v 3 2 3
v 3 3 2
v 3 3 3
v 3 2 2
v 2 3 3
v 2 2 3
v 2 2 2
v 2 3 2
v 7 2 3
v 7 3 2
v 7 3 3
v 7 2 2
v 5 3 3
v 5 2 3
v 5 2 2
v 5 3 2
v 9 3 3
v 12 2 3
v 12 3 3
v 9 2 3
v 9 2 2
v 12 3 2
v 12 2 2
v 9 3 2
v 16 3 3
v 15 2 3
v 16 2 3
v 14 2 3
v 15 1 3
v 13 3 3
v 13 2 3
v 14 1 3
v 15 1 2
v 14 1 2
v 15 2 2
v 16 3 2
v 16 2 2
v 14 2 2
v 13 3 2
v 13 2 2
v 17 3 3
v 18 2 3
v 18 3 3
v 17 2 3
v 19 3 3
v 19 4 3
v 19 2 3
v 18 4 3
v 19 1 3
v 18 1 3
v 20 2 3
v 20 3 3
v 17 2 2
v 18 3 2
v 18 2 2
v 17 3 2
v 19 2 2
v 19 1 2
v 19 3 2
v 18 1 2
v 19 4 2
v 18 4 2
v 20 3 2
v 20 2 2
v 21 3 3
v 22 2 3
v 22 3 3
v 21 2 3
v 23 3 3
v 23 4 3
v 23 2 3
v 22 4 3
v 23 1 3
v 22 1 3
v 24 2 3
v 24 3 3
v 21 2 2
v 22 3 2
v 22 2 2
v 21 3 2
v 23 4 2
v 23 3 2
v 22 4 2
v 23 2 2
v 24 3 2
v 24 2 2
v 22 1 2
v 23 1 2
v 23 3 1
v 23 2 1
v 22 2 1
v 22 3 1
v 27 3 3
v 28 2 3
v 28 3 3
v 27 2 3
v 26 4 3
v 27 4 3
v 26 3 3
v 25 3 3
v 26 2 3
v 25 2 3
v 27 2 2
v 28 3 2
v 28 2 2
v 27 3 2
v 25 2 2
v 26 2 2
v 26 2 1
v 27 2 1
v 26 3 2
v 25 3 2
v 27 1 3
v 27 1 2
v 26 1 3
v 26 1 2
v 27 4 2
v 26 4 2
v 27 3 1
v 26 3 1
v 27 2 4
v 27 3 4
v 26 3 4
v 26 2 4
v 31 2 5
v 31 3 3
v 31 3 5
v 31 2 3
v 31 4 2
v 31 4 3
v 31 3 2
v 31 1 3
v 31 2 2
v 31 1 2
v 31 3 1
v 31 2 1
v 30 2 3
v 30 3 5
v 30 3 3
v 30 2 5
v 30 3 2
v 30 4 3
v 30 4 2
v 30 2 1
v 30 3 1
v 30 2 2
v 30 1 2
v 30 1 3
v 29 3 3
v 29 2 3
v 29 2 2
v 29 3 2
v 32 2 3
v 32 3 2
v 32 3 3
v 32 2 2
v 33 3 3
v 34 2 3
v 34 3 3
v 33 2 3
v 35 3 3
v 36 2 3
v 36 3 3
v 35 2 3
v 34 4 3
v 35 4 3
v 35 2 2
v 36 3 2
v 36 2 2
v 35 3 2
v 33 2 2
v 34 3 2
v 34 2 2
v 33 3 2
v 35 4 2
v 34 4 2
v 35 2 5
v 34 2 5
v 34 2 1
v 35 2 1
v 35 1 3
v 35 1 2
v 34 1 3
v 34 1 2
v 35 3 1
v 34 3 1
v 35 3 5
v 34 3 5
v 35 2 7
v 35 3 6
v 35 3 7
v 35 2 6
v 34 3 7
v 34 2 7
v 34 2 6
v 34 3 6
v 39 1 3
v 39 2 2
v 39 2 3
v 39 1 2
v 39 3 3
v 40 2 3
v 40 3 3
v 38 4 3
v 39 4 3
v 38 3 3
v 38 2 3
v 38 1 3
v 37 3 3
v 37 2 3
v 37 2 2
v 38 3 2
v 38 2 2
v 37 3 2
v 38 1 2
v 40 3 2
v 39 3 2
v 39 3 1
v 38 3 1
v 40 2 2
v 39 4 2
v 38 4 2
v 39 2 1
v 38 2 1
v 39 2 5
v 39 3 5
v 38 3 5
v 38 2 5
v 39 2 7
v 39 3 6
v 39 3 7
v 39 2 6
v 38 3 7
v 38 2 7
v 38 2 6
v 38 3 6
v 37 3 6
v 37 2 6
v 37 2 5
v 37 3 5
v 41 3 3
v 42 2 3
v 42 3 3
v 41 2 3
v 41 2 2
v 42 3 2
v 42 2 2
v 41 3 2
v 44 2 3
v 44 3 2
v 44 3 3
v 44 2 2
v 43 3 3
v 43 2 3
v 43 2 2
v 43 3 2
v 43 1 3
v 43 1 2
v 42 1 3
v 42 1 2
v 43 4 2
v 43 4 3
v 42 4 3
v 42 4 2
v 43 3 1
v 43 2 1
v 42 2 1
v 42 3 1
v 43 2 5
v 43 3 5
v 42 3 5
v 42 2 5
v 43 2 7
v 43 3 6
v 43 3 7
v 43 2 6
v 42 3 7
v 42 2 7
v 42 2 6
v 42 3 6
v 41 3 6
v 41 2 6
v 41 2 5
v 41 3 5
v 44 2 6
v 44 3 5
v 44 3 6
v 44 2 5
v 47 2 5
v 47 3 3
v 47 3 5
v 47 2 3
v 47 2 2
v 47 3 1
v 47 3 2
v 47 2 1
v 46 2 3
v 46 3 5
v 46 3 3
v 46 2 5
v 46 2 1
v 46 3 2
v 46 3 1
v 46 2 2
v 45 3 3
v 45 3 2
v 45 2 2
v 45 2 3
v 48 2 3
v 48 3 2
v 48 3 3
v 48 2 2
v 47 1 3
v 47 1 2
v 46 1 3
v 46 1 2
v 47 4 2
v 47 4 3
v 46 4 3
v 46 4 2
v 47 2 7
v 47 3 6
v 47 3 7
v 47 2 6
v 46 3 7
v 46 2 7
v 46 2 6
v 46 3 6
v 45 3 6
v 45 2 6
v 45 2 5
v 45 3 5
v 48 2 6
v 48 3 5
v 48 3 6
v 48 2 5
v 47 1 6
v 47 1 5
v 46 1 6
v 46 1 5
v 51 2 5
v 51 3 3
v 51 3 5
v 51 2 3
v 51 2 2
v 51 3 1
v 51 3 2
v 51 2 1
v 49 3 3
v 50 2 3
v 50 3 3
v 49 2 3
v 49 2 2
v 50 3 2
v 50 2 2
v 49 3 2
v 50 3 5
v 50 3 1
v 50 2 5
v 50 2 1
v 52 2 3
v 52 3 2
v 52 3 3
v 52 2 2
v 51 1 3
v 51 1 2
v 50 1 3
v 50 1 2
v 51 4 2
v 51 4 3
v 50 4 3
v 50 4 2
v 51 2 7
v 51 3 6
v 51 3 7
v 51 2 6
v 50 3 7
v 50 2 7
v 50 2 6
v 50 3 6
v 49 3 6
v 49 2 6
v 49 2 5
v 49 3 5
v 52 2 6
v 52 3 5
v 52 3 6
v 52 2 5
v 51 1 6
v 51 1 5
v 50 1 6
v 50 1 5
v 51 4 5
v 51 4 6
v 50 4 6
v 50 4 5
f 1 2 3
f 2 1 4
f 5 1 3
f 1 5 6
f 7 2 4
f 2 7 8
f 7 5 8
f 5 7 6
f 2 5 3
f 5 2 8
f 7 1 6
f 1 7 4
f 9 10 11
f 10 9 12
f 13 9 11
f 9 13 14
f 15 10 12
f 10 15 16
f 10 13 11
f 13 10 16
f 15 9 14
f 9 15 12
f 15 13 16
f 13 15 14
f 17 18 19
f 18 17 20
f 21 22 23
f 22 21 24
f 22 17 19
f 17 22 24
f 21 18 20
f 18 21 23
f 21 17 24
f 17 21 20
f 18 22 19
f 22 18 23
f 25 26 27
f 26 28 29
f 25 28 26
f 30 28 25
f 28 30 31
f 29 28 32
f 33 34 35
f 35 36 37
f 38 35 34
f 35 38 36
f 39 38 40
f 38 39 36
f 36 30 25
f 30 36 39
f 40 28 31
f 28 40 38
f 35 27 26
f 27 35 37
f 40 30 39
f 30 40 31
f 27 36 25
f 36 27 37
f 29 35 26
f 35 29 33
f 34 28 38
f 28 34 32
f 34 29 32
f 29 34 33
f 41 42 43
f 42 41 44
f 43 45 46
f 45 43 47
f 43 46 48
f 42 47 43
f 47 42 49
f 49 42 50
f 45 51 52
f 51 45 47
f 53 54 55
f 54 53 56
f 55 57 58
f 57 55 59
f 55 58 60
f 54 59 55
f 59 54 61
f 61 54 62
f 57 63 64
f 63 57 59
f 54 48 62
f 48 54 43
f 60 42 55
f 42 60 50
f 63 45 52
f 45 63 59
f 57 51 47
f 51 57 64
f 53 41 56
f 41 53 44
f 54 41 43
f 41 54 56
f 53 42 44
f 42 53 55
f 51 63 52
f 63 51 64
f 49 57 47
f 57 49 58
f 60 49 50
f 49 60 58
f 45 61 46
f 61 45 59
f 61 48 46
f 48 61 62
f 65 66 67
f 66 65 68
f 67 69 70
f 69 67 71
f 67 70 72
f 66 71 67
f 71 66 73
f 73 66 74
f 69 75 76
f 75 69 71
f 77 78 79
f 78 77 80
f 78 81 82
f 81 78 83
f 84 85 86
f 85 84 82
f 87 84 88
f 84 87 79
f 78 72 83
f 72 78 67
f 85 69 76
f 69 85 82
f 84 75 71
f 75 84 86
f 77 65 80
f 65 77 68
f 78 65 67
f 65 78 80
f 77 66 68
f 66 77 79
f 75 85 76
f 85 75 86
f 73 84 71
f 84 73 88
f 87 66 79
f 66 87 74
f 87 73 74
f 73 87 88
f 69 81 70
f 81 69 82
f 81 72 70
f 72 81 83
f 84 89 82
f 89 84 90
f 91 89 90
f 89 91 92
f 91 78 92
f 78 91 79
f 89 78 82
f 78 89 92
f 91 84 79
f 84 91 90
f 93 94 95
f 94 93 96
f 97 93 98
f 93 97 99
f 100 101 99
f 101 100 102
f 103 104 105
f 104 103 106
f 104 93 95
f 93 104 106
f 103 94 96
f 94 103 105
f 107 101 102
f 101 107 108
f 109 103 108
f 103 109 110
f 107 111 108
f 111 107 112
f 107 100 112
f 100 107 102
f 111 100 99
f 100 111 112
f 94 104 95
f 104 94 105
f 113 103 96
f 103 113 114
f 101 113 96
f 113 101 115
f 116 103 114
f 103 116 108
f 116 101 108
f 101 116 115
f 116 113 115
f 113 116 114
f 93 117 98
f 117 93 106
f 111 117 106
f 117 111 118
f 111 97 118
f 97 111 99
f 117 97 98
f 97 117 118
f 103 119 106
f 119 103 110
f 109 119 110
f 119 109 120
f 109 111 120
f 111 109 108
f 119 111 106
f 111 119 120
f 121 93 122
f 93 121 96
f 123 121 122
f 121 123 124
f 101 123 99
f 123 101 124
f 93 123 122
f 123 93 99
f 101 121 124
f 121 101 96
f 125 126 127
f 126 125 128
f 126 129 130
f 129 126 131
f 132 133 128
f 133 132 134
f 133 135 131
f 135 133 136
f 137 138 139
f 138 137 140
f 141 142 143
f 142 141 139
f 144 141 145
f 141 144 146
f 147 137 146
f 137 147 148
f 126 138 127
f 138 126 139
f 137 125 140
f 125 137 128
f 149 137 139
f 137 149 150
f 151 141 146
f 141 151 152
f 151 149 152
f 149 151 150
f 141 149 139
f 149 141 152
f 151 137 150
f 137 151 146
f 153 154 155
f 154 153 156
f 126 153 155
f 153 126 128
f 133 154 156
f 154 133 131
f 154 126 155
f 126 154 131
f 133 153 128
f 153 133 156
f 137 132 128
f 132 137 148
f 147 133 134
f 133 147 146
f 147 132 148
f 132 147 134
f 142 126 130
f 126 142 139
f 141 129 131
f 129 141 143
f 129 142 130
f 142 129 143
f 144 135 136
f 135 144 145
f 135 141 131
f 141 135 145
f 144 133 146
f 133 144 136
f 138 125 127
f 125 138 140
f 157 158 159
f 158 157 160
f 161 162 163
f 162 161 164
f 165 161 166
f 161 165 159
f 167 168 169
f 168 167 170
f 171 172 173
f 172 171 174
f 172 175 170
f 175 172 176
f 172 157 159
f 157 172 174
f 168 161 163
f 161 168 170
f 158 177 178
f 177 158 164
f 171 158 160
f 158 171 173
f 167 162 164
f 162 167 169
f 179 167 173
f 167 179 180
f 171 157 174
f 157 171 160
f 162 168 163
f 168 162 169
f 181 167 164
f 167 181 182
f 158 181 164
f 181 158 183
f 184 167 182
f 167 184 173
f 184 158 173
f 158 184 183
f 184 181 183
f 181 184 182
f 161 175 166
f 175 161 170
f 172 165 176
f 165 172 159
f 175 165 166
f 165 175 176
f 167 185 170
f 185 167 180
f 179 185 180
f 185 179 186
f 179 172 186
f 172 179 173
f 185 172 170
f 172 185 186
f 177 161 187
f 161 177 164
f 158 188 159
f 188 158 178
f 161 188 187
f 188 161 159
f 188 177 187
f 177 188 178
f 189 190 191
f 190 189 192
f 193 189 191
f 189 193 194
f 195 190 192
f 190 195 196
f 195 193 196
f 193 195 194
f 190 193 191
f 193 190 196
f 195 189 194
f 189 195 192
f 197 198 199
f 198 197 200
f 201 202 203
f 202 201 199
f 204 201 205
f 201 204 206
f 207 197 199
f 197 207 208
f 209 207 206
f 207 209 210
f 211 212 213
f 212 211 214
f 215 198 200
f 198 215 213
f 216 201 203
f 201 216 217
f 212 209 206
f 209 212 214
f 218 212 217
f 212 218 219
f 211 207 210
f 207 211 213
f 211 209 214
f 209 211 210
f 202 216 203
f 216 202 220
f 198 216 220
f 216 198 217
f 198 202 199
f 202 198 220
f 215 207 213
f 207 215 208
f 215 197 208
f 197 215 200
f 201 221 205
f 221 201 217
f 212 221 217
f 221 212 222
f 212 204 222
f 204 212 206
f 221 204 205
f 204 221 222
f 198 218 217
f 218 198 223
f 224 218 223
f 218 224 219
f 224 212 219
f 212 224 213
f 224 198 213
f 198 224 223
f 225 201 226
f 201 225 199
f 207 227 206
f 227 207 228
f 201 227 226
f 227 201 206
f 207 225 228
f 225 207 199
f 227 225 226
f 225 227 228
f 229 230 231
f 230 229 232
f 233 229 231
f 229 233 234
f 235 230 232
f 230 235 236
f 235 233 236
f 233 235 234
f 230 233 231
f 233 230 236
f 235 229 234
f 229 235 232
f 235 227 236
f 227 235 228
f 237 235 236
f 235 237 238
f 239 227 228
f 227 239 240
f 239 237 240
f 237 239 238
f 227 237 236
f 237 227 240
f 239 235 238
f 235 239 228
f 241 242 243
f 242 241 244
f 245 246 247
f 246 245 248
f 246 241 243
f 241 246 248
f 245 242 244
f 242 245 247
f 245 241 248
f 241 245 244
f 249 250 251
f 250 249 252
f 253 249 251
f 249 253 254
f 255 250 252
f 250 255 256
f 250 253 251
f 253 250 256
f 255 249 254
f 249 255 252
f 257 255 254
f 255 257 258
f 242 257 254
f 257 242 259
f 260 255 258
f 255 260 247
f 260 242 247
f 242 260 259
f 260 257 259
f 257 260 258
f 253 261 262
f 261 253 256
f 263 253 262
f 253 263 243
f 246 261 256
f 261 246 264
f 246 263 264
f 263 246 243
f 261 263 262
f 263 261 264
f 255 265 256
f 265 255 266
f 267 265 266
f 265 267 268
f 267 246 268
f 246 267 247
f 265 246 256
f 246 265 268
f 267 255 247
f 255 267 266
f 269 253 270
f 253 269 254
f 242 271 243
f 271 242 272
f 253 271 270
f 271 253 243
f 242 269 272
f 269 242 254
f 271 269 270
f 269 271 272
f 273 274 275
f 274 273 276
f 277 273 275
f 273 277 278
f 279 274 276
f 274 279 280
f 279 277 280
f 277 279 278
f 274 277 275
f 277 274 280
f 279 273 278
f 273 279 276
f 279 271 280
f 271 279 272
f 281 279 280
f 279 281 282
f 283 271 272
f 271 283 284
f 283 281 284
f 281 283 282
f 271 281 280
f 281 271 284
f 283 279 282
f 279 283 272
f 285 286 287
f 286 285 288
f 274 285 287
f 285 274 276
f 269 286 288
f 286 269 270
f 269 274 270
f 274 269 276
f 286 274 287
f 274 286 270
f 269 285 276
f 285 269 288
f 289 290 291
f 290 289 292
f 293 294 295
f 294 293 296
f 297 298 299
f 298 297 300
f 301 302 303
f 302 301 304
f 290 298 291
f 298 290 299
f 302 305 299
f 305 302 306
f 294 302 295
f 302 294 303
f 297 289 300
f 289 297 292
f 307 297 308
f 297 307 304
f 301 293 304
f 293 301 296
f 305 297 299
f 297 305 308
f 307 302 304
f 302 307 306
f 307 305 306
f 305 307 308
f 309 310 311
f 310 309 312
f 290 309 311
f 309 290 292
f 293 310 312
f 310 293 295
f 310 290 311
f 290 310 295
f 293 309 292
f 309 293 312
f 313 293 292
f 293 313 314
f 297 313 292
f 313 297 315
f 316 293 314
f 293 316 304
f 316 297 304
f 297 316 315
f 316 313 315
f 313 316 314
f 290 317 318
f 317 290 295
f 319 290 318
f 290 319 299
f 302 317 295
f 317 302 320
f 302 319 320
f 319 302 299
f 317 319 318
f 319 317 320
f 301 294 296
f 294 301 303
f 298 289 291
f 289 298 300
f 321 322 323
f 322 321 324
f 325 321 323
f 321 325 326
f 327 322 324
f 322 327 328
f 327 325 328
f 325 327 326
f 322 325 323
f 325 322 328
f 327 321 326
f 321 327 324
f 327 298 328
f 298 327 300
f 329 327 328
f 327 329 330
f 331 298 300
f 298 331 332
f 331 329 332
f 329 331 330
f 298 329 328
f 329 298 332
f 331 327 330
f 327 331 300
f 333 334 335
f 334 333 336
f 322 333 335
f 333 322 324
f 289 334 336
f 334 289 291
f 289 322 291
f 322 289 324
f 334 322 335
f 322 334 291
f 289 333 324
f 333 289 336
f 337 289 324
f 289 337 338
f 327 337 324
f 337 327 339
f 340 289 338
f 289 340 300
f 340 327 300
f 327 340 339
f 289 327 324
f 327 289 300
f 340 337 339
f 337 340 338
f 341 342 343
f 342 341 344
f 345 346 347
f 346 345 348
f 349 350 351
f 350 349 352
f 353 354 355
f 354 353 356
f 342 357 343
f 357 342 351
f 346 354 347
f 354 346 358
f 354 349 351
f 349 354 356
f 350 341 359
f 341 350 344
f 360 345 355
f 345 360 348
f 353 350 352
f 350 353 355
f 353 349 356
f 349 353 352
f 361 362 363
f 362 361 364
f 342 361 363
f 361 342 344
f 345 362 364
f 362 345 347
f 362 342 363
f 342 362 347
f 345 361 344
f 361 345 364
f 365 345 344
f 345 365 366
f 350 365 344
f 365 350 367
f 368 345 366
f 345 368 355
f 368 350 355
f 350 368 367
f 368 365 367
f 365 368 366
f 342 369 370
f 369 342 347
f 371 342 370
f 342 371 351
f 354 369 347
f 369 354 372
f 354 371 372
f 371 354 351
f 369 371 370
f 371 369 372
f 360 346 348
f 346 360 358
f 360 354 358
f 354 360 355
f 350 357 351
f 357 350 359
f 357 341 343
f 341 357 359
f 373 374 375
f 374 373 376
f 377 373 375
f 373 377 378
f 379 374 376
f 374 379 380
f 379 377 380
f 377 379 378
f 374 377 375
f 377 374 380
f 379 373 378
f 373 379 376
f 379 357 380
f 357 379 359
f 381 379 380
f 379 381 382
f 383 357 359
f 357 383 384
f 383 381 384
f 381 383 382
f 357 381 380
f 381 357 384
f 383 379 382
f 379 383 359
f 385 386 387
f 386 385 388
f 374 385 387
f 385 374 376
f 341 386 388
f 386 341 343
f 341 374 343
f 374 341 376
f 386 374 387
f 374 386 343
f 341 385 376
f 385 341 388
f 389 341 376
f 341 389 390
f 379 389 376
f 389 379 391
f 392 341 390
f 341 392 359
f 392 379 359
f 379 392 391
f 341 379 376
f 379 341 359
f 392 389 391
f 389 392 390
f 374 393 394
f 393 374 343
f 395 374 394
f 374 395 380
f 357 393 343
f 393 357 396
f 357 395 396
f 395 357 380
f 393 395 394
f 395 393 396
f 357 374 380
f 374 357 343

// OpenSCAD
translate([2, 2, 2]) cube(1);
translate([6, 2, 2]) cube(1);
translate([5, 2, 2]) cube(1);
translate([10, 2, 2]) cube(1);
translate([9, 2, 2]) cube(1);
translate([11, 2, 2]) cube(1);
translate([14, 2, 2]) cube(1);
translate([13, 2, 2]) cube(1);
translate([15, 2, 2]) cube(1);
translate([14, 1, 2]) cube(1);
translate([18, 2, 2]) cube(1);
translate([17, 2, 2]) cube(1);
translate([19, 2, 2]) cube(1);
translate([18, 1, 2]) cube(1);
translate([18, 3, 2]) cube(1);
translate([22, 2, 2]) cube(1);
translate([21, 2, 2]) cube(1);
translate([23, 2, 2]) cube(1);
translate([22, 1, 2]) cube(1);
translate([22, 3, 2]) cube(1);
translate([22, 2, 1]) cube(1);
translate([26, 2, 2]) cube(1);
translate([25, 2, 2]) cube(1);
translate([27, 2, 2]) cube(1);
translate([26, 1, 2]) cube(1);
translate([26, 3, 2]) cube(1);
translate([26, 2, 1]) cube(1);
translate([26, 2, 3]) cube(1);
translate([30, 2, 2]) cube(1);
translate([29, 2, 2]) cube(1);
translate([31, 2, 2]) cube(1);
translate([30, 1, 2]) cube(1);
translate([30, 3, 2]) cube(1);
translate([30, 2, 1]) cube(1);
translate([30, 2, 3]) cube(1);
translate([30, 2, 4]) cube(1);
translate([34, 2, 2]) cube(1);
translate([33, 2, 2]) cube(1);
translate([35, 2, 2]) cube(1);
translate([34, 1, 2]) cube(1);
translate([34, 3, 2]) cube(1);
translate([34, 2, 1]) cube(1);
translate([34, 2, 3]) cube(1);
translate([34, 2, 4]) cube(1);
translate([34, 2, 6]) cube(1);
translate([38, 2, 2]) cube(1);
translate([37, 2, 2]) cube(1);
translate([39, 2, 2]) cube(1);
translate([38, 1, 2]) cube(1);
translate([38, 3, 2]) cube(1);
translate([38, 2, 1]) cube(1);
translate([38, 2, 3]) cube(1);
translate([38, 2, 4]) cube(1);
translate([38, 2, 6]) cube(1);
translate([37, 2, 5]) cube(1);
translate([42, 2, 2]) cube(1);
translate([41, 2, 2]) cube(1);
translate([43, 2, 2]) cube(1);
translate([42, 1, 2]) cube(1);
translate([42, 3, 2]) cube(1);
translate([42, 2, 1]) cube(1);
translate([42, 2, 3]) cube(1);
translate([42, 2, 4]) cube(1);
translate([42, 2, 6]) cube(1);
translate([41, 2, 5]) cube(1);
translate([43, 2, 5]) cube(1);
translate([46, 2, 2]) cube(1);
translate([45, 2, 2]) cube(1);
translate([47, 2, 2]) cube(1);
translate([46, 1, 2]) cube(1);
translate([46, 3, 2]) cube(1);
translate([46, 2, 1]) cube(1);
translate([46, 2, 3]) cube(1);
translate([46, 2, 4]) cube(1);
translate([46, 2, 6]) cube(1);
translate([45, 2, 5]) cube(1);
translate([47, 2, 5]) cube(1);
translate([46, 1, 5]) cube(1);
translate([50, 2, 2]) cube(1);
translate([49, 2, 2]) cube(1);
translate([51, 2, 2]) cube(1);
translate([50, 1, 2]) cube(1);
translate([50, 3, 2]) cube(1);
translate([50, 2, 1]) cube(1);
translate([50, 2, 3]) cube(1);
translate([50, 2, 4]) cube(1);
translate([50, 2, 6]) cube(1);
translate([49, 2, 5]) cube(1);
translate([51, 2, 5]) cube(1);
translate([50, 1, 5]) cube(1);
translate([50, 3, 5]) cube(1);
